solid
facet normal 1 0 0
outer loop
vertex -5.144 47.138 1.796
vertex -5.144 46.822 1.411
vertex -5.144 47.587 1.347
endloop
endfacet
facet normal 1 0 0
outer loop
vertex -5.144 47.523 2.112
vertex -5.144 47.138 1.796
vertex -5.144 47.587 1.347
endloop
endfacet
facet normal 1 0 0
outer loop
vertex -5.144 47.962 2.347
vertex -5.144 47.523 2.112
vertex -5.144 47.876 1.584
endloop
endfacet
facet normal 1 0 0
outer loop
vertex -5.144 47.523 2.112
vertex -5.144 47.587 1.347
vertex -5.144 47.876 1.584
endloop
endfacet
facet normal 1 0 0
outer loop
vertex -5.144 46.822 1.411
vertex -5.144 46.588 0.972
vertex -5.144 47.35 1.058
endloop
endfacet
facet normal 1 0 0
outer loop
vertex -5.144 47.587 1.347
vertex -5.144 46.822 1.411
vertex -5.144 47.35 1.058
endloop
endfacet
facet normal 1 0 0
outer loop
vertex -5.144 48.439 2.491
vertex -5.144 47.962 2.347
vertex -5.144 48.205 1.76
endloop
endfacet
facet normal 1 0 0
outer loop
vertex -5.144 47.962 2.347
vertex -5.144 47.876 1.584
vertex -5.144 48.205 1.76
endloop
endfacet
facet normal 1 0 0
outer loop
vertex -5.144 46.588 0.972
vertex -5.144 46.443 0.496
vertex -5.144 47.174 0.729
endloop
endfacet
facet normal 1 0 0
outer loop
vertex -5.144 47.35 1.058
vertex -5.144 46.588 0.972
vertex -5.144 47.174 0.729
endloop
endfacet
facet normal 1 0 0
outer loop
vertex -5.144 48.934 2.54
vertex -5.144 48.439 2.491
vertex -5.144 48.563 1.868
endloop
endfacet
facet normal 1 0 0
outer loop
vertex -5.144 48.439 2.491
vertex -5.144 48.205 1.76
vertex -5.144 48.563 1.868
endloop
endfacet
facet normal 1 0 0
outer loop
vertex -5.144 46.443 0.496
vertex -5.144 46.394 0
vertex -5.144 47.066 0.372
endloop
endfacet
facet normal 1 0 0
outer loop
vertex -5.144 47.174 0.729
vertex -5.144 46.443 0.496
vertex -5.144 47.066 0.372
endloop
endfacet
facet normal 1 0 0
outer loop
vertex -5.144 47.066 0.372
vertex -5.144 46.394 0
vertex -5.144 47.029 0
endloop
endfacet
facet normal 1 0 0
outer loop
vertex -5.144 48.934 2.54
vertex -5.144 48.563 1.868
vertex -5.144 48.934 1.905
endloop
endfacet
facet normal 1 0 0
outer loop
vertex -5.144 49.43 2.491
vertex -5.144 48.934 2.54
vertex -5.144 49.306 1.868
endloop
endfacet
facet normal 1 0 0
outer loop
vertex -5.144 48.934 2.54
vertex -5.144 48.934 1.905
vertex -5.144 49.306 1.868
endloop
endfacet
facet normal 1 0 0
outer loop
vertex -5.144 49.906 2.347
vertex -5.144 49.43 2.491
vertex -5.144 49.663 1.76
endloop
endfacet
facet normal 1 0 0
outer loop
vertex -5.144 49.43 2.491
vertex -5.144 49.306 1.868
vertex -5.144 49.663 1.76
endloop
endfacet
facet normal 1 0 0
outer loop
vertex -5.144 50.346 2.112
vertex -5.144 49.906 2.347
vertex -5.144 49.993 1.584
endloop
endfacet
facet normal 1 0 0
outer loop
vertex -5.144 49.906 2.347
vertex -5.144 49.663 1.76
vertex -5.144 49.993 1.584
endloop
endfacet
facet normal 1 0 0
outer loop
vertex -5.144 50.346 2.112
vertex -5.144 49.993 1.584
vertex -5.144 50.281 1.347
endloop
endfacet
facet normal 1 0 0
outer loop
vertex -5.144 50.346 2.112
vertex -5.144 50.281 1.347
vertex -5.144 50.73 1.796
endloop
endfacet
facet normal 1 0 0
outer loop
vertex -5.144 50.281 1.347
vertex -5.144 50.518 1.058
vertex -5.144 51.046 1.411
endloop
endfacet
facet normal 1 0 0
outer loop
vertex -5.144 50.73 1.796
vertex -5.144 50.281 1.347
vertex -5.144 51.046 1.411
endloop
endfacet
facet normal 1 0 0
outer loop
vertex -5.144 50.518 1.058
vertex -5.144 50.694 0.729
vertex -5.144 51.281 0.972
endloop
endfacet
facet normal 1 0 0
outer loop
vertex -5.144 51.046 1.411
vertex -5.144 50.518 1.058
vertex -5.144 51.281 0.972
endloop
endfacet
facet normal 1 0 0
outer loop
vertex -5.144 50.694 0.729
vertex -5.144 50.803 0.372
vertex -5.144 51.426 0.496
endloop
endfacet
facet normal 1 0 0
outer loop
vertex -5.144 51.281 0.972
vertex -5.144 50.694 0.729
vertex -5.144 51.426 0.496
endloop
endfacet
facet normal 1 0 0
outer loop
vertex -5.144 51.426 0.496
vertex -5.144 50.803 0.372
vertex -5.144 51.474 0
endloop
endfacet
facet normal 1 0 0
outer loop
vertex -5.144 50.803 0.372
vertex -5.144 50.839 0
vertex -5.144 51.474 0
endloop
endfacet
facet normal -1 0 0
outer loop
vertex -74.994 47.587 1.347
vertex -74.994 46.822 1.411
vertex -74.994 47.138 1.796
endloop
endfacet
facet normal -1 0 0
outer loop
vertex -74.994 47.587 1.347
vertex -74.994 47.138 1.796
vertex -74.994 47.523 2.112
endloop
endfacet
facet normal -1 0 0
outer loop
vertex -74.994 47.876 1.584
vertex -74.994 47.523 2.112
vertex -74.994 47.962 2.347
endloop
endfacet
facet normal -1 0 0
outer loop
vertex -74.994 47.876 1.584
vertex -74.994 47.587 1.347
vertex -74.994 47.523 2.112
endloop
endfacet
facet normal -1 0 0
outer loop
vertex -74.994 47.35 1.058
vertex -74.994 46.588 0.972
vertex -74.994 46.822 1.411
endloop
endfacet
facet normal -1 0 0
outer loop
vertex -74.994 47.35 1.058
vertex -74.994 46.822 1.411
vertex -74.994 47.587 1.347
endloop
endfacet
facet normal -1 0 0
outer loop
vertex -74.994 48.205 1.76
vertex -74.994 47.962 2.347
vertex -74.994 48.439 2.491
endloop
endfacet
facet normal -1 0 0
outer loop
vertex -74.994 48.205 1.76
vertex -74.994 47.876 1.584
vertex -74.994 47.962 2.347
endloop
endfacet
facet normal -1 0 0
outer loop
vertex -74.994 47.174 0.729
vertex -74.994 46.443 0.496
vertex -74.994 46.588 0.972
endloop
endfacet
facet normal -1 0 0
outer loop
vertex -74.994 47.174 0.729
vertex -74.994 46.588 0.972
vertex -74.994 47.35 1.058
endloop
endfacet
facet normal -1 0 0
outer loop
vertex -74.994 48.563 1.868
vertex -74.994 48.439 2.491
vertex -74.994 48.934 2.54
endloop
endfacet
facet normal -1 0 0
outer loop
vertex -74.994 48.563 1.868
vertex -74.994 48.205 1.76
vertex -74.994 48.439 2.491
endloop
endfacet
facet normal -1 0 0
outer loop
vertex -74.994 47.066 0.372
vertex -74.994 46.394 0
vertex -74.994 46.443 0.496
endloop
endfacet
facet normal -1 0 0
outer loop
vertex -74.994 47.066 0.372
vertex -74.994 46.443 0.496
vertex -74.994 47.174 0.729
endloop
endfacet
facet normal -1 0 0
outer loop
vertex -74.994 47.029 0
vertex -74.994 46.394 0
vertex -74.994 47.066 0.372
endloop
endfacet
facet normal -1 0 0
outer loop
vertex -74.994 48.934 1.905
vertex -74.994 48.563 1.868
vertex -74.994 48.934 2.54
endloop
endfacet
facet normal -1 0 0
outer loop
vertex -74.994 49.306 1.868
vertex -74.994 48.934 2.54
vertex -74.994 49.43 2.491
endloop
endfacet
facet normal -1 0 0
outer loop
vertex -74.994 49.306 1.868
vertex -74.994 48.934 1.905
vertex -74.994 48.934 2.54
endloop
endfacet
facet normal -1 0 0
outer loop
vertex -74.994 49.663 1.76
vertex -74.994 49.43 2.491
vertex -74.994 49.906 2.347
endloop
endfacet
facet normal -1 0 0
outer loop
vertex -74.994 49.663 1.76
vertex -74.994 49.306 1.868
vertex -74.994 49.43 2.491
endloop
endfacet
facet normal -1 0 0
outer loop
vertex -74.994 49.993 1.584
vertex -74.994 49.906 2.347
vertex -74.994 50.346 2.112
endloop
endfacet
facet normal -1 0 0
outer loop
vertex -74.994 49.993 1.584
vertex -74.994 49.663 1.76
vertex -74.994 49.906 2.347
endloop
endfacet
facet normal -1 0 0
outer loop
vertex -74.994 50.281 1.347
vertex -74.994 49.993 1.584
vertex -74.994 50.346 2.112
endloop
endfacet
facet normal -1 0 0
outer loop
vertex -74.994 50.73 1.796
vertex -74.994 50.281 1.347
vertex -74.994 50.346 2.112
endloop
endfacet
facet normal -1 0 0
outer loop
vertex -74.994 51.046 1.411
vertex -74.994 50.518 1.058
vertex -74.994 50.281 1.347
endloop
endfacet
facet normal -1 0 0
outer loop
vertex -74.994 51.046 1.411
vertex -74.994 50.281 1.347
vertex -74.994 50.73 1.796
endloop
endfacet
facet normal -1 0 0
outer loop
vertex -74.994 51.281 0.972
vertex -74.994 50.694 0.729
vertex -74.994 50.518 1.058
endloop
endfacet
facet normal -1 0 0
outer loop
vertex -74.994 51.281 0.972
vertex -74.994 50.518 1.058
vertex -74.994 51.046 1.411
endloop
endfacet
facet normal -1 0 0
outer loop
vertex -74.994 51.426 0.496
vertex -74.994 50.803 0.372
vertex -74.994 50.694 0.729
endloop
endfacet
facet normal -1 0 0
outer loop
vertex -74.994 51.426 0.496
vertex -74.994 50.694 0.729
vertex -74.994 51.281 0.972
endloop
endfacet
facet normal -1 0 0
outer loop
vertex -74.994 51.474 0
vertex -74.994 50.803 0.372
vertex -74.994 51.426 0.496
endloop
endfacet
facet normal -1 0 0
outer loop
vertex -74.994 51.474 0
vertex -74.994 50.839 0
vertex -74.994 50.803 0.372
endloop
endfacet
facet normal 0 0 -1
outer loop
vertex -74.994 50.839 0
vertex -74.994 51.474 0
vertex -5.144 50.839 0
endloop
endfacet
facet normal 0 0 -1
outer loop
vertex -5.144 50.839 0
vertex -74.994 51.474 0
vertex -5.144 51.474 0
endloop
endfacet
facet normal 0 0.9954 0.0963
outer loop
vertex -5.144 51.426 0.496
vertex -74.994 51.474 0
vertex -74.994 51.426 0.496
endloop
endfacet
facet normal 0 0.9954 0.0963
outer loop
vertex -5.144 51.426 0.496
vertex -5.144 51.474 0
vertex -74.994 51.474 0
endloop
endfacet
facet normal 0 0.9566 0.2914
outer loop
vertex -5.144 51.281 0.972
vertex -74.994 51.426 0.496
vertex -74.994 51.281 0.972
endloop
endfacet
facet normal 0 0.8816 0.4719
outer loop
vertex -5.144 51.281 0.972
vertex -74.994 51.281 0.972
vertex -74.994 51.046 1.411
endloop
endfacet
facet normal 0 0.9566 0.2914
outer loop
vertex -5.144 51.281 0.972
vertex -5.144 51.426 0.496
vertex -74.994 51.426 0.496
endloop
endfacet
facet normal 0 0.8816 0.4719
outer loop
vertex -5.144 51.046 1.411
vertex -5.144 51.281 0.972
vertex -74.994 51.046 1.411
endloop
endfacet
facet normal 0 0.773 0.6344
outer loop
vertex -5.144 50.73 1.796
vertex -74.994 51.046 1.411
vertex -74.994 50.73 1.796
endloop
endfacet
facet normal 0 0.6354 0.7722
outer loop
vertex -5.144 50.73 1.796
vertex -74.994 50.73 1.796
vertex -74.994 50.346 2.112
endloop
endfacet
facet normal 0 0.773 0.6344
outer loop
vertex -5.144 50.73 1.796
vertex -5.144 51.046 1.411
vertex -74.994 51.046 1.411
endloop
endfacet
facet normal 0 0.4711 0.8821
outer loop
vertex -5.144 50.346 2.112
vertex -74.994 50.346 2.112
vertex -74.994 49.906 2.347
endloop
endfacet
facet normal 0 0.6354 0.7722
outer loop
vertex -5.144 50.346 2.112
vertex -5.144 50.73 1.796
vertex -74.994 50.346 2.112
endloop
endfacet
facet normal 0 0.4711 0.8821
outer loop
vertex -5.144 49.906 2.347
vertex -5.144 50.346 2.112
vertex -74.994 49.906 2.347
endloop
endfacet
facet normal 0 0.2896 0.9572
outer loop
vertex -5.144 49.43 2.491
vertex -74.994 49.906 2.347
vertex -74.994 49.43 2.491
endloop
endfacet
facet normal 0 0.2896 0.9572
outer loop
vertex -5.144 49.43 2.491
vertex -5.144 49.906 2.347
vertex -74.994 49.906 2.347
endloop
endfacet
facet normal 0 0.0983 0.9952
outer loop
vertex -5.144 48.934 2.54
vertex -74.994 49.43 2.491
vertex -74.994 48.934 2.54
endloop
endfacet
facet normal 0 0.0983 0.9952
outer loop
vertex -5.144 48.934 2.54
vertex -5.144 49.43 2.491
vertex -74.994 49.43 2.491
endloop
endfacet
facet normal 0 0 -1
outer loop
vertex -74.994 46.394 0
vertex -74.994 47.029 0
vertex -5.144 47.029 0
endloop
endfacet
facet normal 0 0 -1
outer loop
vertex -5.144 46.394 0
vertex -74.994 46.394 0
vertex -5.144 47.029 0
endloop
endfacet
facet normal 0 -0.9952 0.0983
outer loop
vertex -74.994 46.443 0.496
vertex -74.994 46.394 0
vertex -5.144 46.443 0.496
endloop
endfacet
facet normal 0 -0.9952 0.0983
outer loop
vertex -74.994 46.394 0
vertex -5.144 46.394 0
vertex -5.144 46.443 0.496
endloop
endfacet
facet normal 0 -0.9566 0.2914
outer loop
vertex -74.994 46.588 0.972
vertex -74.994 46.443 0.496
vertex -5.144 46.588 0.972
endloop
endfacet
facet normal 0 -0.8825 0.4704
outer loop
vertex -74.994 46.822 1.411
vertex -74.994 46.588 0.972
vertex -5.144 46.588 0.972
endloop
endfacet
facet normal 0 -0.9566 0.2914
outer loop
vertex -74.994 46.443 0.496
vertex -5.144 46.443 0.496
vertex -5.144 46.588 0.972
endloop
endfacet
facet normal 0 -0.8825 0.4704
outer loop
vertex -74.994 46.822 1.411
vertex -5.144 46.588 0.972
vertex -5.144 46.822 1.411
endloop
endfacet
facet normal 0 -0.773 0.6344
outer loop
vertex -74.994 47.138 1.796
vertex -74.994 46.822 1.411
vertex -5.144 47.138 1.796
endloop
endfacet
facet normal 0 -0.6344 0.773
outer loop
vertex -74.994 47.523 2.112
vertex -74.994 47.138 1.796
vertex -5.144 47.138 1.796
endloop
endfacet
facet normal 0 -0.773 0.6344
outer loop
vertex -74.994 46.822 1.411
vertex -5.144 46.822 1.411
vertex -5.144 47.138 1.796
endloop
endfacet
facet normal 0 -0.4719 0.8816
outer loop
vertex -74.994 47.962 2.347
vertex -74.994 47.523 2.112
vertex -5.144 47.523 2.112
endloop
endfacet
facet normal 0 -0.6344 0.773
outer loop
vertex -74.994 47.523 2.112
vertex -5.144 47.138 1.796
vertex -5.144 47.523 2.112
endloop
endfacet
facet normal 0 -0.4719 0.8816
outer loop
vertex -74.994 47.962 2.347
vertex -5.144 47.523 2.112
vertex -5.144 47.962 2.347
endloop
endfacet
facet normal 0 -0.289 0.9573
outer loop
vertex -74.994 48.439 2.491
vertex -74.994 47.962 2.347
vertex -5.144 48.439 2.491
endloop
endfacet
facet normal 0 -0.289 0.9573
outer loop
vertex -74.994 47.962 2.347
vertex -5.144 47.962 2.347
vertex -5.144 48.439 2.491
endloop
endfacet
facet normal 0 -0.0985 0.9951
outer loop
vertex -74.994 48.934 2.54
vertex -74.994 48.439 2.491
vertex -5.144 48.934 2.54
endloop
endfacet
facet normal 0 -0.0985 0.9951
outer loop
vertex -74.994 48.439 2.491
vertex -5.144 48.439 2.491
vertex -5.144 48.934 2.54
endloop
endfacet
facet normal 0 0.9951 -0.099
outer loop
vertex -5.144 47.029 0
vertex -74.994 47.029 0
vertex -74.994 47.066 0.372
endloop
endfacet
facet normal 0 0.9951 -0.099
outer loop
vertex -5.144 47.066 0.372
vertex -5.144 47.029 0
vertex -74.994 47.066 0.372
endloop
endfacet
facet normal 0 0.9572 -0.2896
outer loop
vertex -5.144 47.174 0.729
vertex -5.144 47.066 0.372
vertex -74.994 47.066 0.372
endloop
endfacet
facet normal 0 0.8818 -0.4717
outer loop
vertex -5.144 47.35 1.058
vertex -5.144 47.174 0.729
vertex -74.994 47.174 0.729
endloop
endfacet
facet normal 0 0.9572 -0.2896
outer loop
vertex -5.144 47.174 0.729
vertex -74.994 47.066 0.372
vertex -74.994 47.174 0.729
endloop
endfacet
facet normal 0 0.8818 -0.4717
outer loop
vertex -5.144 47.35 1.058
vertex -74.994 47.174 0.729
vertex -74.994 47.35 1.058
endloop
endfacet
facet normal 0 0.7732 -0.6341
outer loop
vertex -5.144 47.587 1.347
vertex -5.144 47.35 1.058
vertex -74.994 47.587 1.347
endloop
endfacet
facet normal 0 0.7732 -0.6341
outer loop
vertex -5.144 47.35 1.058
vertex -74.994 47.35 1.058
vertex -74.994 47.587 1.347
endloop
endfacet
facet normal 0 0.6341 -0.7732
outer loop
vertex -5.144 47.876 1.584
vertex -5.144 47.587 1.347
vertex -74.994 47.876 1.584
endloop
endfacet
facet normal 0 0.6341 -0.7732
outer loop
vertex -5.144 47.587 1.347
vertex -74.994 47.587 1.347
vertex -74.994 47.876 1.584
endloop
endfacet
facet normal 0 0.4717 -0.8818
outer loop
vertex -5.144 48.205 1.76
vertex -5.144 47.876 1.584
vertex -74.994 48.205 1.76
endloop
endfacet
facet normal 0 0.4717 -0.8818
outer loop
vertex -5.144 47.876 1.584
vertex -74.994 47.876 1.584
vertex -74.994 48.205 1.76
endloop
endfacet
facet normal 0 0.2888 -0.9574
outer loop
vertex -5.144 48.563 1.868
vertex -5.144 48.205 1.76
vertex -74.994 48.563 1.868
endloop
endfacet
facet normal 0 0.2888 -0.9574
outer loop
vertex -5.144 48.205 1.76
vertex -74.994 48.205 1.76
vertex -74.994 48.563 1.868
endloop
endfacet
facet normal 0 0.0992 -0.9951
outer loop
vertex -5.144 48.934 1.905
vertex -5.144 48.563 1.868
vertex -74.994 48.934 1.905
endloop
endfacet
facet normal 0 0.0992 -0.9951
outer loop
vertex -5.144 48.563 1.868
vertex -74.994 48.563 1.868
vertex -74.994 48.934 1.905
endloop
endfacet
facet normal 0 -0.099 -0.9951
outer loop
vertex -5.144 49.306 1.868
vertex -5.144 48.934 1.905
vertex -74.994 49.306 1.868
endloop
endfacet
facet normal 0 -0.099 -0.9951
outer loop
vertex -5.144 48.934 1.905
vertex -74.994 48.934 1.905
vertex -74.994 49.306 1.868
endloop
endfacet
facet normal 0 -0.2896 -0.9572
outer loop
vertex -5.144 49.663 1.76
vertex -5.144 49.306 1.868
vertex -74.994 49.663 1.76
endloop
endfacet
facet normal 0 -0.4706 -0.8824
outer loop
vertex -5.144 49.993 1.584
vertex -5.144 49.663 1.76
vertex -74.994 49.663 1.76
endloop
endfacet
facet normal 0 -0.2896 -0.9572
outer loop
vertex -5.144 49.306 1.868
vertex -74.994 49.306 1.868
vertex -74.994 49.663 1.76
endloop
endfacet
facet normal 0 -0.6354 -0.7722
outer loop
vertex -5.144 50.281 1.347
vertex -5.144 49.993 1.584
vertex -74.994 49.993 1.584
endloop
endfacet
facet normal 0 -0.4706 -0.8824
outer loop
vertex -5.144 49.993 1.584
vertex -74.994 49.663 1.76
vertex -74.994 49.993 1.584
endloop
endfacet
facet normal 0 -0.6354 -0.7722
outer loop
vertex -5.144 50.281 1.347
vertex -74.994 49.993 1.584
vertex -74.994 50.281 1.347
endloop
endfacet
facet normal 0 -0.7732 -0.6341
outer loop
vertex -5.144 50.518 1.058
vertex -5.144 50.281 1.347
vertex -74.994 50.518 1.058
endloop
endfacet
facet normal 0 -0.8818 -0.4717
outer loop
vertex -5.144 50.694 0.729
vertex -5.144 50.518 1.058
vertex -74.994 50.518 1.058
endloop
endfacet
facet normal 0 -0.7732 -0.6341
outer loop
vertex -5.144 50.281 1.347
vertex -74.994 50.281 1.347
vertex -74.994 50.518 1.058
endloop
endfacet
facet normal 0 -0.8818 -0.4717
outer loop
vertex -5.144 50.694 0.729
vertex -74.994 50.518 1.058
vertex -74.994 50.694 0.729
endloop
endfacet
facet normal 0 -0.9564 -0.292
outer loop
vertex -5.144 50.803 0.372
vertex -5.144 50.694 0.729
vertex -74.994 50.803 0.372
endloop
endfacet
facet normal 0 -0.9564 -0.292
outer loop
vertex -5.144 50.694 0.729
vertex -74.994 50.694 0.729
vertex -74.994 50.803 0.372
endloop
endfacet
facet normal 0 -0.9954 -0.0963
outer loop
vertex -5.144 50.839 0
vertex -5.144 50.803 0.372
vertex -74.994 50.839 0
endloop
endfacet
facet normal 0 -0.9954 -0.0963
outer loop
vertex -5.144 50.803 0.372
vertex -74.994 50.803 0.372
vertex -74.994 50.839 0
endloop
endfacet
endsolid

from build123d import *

# Parameters (mm, degrees)
F0_W     = 69.85
F0_H     = 5.08
F1_DEPTH = 2.54
F2_R     = 2.53999
F4_D     = 3.81


# Not quite as in the source:
# - a fillet or chamfer is up to 0.001 mm smaller than in the source, because OpenCascade refuses the exact size


with BuildPart() as f1:
    # F0 (on Top) → F1 (new body)
    with BuildSketch(Plane.XY):
        with Locations((-40.0687940419, 48.9344280766)):
            Rectangle(F0_W, F0_H)
    extrude(amount=F1_DEPTH)

    # F2 (radius 2.54 in the source; OpenCascade refuses exactly that, so slightly less here)
    f2_edges = [f1.edges().sort_by_distance(p)[0] for p in [
        (-40.068794, 46.394428, 2.54),
        (-40.068794, 51.474428, 2.54),
    ]]
    fillet(f2_edges, radius=F2_R)

    # F4 (through all)
    with Locations(Plane.YZ.offset(-5.1437940419)):
        with Locations((48.9344280766, 0)):
            Hole(F4_D / 2)


solid = f1.part
